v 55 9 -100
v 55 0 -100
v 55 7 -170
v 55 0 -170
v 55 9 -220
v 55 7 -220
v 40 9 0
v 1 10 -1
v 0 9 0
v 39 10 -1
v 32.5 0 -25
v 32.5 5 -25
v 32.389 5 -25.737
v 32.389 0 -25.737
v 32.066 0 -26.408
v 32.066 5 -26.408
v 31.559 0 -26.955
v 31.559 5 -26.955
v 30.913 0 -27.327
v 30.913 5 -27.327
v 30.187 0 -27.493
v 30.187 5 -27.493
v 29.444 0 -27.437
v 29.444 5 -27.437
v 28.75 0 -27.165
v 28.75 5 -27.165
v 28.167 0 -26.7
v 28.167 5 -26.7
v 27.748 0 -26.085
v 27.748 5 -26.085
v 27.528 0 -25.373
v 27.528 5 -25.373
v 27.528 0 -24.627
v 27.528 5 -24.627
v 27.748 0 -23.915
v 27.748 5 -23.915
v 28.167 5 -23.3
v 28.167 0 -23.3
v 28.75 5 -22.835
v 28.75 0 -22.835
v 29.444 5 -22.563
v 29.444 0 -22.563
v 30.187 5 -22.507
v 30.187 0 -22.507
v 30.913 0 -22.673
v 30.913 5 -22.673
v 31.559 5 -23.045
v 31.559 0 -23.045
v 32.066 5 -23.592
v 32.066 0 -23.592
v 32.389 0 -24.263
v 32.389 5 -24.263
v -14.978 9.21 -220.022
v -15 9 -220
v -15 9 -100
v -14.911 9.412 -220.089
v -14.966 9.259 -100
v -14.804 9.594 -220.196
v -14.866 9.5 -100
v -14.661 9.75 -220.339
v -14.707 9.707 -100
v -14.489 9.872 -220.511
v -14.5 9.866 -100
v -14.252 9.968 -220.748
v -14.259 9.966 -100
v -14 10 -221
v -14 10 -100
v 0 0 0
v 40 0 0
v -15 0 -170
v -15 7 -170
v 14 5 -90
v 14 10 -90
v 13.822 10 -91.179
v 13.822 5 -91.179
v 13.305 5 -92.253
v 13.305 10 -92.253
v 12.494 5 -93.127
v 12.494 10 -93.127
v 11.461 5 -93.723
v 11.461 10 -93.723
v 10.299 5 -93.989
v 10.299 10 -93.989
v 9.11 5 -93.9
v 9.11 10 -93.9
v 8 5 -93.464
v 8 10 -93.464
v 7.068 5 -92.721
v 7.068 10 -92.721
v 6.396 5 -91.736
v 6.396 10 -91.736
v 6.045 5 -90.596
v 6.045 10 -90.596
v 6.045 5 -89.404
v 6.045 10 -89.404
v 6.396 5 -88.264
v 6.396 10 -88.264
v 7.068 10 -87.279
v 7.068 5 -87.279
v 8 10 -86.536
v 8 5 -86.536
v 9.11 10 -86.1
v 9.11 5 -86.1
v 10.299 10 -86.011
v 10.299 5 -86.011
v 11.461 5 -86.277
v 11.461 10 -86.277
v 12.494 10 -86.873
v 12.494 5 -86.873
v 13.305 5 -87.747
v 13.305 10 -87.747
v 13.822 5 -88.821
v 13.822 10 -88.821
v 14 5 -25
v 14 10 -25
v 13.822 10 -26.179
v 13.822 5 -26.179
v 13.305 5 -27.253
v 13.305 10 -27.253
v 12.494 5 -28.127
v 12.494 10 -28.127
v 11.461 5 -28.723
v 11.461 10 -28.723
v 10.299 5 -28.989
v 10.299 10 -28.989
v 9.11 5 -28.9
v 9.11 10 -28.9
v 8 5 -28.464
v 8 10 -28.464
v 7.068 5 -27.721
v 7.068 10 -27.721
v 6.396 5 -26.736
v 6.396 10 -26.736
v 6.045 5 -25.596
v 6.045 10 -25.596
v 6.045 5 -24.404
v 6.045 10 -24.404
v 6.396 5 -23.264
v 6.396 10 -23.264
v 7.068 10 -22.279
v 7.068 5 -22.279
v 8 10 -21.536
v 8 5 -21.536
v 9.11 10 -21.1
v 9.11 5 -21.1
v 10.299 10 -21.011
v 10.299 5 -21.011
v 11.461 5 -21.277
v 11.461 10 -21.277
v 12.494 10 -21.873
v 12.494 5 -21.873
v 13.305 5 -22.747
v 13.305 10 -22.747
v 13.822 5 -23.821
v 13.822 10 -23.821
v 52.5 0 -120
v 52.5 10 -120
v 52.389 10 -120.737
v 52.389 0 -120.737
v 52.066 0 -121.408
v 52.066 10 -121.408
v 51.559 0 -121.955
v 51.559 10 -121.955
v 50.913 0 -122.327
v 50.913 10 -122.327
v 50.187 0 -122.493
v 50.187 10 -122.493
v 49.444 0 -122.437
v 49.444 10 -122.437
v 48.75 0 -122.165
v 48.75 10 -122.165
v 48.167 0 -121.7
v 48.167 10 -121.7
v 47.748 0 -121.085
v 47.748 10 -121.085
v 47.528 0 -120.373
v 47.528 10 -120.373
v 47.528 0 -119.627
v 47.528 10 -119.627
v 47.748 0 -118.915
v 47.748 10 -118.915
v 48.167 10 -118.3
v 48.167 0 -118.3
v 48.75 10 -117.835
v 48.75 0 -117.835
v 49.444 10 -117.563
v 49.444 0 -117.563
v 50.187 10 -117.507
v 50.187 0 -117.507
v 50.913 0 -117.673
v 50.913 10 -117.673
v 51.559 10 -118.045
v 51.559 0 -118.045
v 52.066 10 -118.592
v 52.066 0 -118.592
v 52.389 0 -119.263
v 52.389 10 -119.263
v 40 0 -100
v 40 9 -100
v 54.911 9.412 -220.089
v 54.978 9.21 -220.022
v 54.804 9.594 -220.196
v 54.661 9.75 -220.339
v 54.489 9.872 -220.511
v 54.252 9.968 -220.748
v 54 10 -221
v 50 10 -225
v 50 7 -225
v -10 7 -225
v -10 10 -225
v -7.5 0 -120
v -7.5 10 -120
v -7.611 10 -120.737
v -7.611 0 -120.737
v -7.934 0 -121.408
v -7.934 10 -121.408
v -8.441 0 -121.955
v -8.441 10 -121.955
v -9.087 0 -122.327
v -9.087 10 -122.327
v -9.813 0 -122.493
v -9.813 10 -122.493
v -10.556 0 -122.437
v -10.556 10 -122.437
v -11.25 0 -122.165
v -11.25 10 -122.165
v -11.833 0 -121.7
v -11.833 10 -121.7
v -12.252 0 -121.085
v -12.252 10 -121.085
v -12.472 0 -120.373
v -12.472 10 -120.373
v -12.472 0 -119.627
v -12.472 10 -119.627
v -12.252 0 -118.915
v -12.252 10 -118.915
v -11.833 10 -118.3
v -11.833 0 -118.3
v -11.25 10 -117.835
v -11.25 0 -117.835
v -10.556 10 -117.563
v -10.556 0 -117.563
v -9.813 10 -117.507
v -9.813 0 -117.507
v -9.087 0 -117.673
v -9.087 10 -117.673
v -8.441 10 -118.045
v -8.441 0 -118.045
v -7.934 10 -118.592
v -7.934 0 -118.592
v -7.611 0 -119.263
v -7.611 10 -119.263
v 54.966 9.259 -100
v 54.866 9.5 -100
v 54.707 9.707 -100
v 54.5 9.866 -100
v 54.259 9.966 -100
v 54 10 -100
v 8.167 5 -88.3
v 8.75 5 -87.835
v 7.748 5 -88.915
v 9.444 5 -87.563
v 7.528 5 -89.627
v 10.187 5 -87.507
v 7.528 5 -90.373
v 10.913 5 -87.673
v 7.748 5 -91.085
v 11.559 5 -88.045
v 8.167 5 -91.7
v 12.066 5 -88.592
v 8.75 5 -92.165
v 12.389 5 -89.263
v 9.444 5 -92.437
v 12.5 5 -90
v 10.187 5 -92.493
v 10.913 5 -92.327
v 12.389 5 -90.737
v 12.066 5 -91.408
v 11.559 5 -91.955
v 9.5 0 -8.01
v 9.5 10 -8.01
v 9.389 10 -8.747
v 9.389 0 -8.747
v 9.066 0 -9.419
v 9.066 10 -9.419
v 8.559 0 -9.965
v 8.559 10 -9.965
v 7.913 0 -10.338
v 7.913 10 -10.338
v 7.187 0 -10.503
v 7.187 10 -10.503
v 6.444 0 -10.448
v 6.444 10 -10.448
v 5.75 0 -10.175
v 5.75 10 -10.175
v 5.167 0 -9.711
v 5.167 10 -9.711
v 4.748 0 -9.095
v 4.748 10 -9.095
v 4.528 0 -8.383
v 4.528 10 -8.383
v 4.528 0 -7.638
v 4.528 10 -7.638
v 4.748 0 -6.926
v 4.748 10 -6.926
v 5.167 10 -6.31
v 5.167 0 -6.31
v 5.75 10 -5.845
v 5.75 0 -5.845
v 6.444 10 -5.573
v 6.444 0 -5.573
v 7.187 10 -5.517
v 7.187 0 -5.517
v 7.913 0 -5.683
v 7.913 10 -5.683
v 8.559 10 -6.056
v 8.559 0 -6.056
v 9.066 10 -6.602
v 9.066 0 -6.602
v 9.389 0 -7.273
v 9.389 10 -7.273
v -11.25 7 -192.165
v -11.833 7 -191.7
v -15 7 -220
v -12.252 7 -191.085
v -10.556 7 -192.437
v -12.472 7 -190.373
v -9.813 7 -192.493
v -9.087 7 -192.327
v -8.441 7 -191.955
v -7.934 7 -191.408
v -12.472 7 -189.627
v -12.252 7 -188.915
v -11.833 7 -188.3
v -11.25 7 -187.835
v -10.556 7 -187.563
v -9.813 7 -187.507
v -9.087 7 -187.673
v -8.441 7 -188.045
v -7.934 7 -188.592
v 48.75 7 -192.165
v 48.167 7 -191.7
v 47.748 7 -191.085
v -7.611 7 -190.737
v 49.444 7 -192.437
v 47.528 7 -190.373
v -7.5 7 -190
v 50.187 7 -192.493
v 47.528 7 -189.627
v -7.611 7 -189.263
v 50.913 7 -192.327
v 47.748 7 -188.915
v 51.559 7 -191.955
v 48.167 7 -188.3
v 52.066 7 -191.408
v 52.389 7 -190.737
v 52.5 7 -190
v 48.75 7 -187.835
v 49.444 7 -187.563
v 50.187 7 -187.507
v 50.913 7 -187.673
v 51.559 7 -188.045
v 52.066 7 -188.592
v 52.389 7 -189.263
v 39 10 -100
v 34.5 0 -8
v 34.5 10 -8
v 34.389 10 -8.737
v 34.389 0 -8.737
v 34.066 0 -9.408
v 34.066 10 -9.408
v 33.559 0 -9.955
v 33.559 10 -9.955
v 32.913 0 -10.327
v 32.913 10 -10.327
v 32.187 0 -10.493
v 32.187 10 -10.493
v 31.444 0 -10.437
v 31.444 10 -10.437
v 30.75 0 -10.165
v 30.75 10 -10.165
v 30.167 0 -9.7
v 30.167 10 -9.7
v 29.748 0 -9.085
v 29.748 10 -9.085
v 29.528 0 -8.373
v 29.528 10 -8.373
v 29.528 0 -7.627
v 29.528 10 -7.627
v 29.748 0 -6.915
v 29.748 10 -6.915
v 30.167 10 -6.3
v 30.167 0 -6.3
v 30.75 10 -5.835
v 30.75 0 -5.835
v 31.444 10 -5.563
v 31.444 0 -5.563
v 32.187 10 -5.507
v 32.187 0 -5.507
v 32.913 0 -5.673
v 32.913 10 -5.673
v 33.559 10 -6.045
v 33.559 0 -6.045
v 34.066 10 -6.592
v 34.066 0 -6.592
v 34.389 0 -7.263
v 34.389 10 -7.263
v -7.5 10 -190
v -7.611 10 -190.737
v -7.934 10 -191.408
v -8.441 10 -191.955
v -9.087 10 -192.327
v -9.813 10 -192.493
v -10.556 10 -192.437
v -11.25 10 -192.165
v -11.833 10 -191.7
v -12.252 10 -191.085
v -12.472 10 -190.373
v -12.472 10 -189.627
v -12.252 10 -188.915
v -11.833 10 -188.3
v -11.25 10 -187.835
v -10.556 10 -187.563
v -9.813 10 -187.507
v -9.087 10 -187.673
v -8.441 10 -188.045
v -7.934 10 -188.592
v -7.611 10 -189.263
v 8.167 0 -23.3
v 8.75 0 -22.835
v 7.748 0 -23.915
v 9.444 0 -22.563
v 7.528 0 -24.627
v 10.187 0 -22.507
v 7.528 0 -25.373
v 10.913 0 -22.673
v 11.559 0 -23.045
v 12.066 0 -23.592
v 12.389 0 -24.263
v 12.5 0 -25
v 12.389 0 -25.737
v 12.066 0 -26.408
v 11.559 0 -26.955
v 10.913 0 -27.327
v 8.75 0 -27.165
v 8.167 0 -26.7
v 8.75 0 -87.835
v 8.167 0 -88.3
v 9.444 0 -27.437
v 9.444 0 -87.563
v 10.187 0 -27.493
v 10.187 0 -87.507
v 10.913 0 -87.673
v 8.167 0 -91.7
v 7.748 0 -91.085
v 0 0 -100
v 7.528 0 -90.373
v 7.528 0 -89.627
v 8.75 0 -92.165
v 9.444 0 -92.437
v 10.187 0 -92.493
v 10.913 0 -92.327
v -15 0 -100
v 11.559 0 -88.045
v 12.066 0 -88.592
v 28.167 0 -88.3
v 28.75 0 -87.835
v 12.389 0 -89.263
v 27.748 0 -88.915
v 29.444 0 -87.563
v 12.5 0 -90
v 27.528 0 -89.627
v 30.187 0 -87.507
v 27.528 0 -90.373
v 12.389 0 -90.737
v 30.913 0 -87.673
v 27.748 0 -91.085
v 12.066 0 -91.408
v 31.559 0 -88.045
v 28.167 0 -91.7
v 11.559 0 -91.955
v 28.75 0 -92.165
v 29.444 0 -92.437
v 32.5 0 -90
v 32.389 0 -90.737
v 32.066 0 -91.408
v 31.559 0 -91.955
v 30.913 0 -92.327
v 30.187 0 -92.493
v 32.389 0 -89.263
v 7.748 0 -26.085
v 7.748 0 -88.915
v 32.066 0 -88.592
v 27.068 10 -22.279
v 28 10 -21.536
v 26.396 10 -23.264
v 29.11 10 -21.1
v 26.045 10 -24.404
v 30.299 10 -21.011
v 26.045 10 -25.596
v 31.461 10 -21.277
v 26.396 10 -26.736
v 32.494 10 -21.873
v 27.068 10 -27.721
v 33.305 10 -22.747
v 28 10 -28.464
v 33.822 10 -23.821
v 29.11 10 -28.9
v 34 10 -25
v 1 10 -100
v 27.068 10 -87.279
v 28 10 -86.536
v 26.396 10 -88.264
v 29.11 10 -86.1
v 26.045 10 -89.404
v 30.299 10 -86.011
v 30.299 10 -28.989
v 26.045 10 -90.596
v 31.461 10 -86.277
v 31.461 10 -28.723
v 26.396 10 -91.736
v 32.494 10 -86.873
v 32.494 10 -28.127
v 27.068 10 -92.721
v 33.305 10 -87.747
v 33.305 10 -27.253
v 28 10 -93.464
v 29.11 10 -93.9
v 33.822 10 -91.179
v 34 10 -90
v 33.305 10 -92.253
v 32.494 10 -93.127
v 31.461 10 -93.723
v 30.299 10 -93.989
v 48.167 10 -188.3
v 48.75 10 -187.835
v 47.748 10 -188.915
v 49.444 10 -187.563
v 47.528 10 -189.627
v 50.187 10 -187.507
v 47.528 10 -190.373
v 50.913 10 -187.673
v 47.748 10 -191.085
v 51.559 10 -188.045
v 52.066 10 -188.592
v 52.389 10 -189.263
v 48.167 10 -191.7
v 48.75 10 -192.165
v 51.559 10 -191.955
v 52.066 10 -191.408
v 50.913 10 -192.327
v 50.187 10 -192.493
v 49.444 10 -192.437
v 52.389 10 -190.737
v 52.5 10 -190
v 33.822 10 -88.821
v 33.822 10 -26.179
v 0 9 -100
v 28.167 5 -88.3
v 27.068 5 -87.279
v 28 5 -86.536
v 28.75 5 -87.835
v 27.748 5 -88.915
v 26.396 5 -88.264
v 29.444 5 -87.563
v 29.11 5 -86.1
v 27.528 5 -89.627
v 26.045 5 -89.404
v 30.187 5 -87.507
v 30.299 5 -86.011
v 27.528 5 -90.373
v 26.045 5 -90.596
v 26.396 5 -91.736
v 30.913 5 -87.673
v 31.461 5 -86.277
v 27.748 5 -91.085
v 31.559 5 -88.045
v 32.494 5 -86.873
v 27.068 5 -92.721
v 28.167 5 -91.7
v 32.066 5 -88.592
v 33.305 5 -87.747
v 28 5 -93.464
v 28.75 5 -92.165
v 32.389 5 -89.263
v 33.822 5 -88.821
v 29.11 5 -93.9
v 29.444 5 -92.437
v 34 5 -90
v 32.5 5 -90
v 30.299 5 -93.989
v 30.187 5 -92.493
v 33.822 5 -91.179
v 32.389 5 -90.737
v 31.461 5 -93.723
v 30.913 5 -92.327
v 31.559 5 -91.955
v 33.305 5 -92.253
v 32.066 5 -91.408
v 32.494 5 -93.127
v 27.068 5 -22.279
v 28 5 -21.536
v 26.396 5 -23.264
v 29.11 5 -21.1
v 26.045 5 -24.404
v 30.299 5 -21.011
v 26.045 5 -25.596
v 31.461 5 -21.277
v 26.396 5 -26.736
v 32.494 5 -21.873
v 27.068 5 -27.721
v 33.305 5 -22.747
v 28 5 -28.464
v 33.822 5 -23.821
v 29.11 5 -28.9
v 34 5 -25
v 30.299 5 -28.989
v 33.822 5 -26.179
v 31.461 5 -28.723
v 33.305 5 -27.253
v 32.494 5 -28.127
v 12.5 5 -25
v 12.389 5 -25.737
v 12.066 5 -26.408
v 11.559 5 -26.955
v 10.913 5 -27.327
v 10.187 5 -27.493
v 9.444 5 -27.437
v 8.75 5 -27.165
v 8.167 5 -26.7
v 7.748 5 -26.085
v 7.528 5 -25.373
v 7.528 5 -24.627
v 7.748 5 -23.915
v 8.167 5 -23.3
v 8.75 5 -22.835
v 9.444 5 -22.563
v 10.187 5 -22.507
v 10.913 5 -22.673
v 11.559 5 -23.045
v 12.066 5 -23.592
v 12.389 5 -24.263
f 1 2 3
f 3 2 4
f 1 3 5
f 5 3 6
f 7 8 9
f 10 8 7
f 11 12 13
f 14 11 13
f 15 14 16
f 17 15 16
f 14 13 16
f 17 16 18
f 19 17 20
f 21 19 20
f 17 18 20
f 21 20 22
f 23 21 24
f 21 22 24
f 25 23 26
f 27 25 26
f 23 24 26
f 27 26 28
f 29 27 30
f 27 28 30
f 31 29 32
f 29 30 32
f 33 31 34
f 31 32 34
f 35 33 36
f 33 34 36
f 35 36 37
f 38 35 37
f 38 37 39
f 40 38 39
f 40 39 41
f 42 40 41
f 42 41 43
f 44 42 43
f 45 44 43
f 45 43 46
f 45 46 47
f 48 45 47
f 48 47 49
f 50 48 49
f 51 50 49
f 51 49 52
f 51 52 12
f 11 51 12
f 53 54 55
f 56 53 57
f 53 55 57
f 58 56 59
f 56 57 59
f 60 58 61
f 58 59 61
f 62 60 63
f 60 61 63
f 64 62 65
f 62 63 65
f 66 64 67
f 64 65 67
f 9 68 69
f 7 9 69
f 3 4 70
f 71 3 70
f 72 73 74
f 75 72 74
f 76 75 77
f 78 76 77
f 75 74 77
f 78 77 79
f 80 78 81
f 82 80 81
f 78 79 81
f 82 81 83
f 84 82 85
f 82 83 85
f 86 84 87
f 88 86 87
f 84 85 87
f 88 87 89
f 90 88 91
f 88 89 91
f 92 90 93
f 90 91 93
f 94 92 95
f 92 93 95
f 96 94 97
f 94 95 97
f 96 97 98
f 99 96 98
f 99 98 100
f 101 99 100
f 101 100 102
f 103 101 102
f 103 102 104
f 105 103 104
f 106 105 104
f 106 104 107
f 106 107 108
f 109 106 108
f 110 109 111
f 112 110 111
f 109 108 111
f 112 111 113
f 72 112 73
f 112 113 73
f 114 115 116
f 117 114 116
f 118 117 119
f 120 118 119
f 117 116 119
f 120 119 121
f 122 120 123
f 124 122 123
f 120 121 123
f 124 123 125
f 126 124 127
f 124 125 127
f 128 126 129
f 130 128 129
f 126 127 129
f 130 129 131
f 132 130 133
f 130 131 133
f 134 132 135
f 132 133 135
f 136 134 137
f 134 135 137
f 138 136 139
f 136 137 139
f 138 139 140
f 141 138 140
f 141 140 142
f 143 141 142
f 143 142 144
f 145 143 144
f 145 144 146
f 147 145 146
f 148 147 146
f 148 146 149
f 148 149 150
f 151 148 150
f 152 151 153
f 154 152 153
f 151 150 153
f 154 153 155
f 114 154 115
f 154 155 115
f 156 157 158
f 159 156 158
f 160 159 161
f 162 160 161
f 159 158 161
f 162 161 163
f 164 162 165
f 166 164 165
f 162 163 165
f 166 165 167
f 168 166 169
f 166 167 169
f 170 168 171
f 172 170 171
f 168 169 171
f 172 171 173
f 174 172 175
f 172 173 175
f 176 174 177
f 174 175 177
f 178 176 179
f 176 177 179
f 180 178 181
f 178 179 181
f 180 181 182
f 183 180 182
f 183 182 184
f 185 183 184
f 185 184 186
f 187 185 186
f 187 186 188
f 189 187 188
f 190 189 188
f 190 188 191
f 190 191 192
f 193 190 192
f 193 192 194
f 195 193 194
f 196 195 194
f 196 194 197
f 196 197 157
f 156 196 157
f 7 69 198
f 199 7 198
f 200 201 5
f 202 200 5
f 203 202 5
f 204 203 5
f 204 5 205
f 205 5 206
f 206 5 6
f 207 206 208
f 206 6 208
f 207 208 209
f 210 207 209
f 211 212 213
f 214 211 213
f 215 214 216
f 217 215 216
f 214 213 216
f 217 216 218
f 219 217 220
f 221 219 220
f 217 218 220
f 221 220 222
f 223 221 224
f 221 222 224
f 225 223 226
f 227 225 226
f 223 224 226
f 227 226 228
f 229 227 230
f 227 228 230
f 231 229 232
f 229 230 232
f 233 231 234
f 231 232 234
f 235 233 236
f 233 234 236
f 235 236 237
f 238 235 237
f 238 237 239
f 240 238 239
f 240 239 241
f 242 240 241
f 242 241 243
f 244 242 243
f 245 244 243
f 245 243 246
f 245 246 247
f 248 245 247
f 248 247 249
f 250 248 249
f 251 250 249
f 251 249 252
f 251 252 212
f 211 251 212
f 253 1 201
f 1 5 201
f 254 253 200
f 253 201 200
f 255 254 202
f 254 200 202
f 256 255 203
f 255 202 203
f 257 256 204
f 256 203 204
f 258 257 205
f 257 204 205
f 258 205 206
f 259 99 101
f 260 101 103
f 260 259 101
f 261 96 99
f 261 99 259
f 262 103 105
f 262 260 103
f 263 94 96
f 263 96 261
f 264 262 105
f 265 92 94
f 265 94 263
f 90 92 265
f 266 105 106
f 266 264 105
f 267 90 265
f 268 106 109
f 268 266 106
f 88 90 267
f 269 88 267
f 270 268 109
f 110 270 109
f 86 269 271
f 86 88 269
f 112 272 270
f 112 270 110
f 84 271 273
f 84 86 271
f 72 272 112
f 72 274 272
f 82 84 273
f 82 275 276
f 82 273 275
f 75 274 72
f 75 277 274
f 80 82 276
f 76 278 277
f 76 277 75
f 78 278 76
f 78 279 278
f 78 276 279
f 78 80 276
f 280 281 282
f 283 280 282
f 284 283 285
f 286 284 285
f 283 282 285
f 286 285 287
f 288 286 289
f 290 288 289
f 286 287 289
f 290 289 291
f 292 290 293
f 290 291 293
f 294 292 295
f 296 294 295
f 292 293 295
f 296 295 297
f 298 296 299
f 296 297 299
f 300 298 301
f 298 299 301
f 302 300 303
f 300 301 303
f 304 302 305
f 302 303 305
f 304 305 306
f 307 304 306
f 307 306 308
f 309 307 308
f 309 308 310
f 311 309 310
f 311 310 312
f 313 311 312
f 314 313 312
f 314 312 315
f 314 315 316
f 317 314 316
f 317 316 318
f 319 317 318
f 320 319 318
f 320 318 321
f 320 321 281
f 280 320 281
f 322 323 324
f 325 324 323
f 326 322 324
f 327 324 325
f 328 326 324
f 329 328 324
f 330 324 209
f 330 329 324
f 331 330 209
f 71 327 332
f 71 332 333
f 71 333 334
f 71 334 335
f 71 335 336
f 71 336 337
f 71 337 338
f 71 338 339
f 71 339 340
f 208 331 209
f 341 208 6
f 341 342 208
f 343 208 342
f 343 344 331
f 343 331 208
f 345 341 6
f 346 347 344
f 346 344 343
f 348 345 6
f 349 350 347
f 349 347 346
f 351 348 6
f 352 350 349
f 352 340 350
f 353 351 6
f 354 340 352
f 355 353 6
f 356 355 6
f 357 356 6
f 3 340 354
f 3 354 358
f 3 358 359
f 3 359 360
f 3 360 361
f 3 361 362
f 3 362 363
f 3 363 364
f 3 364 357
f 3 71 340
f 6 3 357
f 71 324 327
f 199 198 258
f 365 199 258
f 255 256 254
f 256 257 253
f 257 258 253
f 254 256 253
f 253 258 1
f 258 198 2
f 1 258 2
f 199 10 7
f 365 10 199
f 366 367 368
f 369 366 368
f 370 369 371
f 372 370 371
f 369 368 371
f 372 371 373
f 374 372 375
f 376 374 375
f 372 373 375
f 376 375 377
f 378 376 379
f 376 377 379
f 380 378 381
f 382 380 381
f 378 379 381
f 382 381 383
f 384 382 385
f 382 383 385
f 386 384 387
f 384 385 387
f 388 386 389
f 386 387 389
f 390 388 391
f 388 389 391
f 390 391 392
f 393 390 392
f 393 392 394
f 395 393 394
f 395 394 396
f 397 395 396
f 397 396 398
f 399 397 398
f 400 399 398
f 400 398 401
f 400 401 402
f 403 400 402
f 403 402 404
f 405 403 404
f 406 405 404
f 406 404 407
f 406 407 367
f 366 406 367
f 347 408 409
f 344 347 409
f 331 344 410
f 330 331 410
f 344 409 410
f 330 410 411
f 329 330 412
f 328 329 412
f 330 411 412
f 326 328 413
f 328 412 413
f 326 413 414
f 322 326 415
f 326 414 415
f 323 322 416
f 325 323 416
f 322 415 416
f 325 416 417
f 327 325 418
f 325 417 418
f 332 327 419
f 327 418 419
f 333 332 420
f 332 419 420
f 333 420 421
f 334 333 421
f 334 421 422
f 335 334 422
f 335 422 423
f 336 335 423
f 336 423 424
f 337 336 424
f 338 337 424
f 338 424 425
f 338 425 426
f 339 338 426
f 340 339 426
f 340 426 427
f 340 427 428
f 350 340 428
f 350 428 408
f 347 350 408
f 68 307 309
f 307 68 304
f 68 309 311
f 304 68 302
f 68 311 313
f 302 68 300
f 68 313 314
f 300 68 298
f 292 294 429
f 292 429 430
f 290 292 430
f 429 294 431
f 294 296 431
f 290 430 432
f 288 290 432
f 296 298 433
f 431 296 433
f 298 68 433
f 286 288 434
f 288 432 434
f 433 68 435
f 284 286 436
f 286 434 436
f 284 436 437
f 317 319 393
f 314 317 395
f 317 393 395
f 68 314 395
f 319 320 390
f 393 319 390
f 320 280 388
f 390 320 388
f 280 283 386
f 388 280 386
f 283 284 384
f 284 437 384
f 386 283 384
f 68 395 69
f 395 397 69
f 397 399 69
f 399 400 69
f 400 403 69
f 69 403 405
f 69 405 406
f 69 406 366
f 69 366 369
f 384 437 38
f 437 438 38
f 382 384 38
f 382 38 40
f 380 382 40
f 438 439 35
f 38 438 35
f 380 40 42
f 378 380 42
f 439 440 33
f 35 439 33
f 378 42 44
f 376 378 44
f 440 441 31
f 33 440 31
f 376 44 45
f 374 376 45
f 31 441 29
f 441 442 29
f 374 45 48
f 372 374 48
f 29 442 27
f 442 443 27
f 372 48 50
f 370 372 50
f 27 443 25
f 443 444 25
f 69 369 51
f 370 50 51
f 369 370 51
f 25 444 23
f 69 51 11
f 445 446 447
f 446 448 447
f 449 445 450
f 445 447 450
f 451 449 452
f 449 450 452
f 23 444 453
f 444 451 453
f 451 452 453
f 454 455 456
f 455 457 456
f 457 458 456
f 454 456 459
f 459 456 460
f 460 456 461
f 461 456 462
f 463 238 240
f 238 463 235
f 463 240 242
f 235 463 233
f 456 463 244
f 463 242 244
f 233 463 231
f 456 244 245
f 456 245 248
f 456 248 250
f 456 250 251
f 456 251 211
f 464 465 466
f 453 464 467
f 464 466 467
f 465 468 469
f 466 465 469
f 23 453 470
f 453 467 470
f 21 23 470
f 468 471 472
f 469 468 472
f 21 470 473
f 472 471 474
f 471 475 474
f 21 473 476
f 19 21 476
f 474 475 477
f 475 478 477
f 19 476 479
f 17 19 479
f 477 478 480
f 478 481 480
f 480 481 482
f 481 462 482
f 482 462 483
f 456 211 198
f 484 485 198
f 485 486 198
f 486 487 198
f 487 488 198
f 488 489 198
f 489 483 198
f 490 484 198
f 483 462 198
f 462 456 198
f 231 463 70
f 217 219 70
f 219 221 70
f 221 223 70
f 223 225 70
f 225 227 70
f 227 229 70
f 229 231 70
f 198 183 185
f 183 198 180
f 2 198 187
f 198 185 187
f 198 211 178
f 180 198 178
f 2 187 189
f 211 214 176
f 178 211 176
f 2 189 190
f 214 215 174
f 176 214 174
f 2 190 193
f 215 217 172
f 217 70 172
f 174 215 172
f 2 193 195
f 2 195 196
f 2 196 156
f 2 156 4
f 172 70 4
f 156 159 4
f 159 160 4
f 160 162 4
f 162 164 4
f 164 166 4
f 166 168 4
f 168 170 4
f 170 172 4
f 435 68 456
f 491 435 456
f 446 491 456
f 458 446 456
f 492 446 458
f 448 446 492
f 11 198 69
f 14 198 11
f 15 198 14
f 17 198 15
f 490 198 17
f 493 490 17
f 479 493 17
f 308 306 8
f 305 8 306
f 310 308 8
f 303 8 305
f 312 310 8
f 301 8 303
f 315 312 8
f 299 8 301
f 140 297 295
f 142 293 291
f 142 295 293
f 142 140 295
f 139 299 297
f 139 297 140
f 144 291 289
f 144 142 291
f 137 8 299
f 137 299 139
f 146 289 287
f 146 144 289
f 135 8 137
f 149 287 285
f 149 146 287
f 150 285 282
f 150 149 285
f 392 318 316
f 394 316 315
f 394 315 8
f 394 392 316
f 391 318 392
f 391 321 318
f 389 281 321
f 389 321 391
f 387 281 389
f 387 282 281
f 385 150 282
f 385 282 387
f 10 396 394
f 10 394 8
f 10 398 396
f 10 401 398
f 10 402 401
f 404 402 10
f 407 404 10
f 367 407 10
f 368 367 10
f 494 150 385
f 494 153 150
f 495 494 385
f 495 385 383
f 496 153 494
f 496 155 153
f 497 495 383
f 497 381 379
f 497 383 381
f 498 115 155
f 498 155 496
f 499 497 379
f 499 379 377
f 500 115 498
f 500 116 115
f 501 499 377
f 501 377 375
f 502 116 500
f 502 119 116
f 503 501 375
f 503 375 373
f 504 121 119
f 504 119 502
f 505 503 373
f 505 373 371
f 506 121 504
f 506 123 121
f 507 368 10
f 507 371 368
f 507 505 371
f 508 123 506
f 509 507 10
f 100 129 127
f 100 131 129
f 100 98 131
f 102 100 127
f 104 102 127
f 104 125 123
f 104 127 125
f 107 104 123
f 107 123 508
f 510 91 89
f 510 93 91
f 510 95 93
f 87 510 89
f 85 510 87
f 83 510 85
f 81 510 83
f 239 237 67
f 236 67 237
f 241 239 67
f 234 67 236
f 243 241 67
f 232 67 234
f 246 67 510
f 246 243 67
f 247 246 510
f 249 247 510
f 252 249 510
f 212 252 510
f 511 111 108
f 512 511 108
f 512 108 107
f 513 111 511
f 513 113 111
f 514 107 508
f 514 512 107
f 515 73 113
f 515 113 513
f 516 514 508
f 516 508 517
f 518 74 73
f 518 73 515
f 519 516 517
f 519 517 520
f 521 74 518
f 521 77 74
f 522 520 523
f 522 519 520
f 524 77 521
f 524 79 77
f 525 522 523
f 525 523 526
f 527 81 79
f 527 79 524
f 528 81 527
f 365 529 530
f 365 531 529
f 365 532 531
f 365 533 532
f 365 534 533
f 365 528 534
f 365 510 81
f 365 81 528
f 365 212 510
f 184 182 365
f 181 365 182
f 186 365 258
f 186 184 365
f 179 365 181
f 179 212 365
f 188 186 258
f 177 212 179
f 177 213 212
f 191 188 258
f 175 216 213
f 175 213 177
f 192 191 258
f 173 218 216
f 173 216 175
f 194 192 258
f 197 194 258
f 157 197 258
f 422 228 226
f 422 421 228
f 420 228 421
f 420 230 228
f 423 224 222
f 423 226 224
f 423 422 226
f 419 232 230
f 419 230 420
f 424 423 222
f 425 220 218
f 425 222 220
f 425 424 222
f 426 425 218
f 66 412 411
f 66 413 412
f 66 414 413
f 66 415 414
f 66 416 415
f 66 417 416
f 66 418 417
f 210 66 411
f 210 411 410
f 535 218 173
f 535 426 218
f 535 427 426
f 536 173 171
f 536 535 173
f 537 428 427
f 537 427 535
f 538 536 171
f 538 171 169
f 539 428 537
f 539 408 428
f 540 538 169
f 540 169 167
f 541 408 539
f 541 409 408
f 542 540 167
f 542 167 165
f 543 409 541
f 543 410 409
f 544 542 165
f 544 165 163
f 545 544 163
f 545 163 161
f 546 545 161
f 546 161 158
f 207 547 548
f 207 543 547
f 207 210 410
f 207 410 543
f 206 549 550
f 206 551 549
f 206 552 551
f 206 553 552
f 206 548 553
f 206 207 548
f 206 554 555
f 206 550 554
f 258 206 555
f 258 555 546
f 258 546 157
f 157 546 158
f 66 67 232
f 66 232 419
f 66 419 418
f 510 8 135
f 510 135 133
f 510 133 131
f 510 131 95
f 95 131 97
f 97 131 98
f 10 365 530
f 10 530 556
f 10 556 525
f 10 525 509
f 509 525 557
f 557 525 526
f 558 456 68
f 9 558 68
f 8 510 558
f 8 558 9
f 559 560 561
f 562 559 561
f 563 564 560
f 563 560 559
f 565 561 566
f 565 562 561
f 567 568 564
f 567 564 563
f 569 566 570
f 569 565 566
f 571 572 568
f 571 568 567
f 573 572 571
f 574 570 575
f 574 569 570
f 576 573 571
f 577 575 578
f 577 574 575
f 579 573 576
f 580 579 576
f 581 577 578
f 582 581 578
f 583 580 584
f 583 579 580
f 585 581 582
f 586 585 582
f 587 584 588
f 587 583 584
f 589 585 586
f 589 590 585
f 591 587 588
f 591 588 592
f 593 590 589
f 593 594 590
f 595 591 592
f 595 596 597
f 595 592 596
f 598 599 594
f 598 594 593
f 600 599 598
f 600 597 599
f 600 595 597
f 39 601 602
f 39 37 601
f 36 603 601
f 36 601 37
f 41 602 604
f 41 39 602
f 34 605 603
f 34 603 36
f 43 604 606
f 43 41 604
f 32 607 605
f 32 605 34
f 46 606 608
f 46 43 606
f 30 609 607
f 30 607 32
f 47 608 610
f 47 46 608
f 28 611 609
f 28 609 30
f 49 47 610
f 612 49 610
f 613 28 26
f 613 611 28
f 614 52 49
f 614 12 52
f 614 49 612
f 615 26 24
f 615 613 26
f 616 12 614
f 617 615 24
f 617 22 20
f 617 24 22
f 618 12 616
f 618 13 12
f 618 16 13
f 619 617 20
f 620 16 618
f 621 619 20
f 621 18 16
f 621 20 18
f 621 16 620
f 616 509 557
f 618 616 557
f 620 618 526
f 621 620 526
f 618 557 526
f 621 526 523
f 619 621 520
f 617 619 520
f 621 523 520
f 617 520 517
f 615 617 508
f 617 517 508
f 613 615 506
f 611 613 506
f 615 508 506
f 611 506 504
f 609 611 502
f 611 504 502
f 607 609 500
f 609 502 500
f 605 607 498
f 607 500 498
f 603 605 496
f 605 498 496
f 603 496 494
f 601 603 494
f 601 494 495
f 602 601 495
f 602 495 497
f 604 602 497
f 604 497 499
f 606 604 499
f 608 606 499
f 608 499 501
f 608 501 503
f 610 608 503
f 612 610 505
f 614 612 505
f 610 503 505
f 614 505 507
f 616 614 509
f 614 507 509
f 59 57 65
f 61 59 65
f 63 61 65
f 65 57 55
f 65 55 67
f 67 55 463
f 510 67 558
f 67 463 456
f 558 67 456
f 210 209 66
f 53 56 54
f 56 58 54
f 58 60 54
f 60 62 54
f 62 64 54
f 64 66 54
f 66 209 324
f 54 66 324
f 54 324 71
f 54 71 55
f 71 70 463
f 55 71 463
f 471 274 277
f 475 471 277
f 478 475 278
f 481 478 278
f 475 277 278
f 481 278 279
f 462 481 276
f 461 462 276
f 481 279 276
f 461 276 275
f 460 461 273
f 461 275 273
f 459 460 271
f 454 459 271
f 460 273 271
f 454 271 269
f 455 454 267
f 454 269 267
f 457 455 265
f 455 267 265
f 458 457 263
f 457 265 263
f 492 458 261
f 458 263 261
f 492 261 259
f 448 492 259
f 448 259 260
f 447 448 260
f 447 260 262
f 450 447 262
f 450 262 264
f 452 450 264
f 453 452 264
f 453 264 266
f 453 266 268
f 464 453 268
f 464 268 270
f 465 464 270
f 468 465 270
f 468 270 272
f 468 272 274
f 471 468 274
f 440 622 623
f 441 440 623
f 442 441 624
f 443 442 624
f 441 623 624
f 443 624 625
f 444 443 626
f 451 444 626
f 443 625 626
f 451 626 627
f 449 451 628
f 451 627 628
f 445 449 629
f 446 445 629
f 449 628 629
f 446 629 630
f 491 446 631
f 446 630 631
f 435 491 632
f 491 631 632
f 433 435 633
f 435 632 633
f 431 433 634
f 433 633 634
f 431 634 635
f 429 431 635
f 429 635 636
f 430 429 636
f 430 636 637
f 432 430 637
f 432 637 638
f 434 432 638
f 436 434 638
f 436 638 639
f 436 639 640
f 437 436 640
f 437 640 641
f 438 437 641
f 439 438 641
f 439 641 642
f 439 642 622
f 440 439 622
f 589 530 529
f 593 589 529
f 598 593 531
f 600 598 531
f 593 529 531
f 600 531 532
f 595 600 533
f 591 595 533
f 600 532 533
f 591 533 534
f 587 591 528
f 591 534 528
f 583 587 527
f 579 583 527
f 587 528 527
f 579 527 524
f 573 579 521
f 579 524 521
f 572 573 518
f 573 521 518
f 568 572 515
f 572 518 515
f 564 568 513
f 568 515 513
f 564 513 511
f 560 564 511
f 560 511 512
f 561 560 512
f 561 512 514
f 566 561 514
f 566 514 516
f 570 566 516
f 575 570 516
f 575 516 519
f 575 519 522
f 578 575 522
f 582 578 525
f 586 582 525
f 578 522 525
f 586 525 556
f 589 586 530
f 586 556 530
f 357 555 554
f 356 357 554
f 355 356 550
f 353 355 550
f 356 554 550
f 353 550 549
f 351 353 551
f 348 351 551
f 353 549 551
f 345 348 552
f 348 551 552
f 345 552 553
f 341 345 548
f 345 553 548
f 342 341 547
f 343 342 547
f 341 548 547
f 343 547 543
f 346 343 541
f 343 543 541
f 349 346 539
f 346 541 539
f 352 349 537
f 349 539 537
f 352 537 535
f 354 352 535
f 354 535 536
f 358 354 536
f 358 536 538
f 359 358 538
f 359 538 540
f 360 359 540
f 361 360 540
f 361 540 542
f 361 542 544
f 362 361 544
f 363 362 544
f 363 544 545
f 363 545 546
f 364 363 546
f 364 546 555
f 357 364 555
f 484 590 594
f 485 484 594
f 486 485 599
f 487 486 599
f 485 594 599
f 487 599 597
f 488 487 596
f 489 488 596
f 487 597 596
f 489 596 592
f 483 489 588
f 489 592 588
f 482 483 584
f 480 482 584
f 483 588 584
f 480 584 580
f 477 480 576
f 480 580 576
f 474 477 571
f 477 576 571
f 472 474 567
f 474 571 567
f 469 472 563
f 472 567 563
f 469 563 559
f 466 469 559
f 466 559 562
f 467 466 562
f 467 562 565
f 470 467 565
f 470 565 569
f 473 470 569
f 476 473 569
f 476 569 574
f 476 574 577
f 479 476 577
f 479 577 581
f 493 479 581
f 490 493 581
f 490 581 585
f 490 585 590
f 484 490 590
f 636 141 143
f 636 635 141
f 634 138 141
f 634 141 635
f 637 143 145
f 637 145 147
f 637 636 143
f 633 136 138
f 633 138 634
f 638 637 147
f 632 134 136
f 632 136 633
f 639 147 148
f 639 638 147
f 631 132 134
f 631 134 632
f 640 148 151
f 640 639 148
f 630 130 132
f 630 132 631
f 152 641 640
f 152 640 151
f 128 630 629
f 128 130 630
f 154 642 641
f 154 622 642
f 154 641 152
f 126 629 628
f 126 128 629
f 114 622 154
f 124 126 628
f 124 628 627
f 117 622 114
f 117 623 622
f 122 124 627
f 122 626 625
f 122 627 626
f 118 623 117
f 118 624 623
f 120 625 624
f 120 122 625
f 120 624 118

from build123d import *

# Parameters (mm, degrees)
BOSS_EXTRUDE1_DEPTH = 10
CUT_EXTRUDE1_DEPTH  = 7
SKETCH4_R           = 4
CUT_EXTRUDE2_DEPTH  = 5
SKETCH5_R           = 2.5
CUT_EXTRUDE3_DEPTH  = 6
SKETCH6_R           = 2.5
CUT_EXTRUDE4_DEPTH  = 11
SKETCH7_R           = 2.5
CUT_EXTRUDE5_DEPTH  = 11
CHAMFER1_SIZE       = 1
FILLET1_R           = 1


with BuildPart() as part:
    # Sketch2 → Boss-Extrude1 (new body)
    with BuildSketch(Plane(origin=(0, 0, 0), x_dir=(1, 0, 0), z_dir=(0, 1, 0))):
        Polygon((0, 0), (40, 0), (40, 100), (55, 100), (55, 220), (50, 225), (-10, 225), (-15, 220), (-15, 100), (0, 100), align=None)
    extrude(amount=BOSS_EXTRUDE1_DEPTH)

    # Sketch3 → Cut-Extrude1 (cut)
    with BuildSketch(Plane.XZ):
        Polygon((-15, -220), (-10, -225), (50, -225), (55, -220), (55, -170), (-15, -170), align=None)
    extrude(amount=-CUT_EXTRUDE1_DEPTH, mode=Mode.SUBTRACT)

    # Sketch4 → Cut-Extrude2 (cut)
    with BuildSketch(Plane(origin=(0, 10, 0), x_dir=(1, 0, 0), z_dir=(0, 1, 0))):
        with Locations((10, 25)):
            Circle(SKETCH4_R)
        with Locations((30, 25)):
            Circle(SKETCH4_R)
        with Locations((10, 90)):
            Circle(SKETCH4_R)
        with Locations((30, 90)):
            Circle(SKETCH4_R)
    extrude(amount=-CUT_EXTRUDE2_DEPTH, mode=Mode.SUBTRACT)

    # Sketch5 → Cut-Extrude3 (cut, through all)
    with BuildSketch(Plane(origin=(0, 5, 0), x_dir=(1, 0, 0), z_dir=(0, 1, 0))):
        with Locations((30, 90)):
            Circle(SKETCH5_R)
        with Locations((10, 90)):
            Circle(SKETCH5_R)
        with Locations((10, 25)):
            Circle(SKETCH5_R)
        with Locations((30, 25)):
            Circle(SKETCH5_R)
    extrude(amount=-CUT_EXTRUDE3_DEPTH, mode=Mode.SUBTRACT)

    # Sketch6 → Cut-Extrude4 (cut, through all)
    with BuildSketch(Plane(origin=(0, 10, 0), x_dir=(1, 0, 0), z_dir=(0, 1, 0))):
        with Locations((50, 190)):
            Circle(SKETCH6_R)
        with Locations((-10, 190)):
            Circle(SKETCH6_R)
        with Locations((-10, 120)):
            Circle(SKETCH6_R)
        with Locations((50, 120)):
            Circle(SKETCH6_R)
    extrude(amount=-CUT_EXTRUDE4_DEPTH, mode=Mode.SUBTRACT)

    # Sketch7 → Cut-Extrude5 (cut, through all)
    with BuildSketch(Plane(origin=(0, 10, 0), x_dir=(1, 0, 0), z_dir=(0, 1, 0))):
        with Locations((32, 8)):
            Circle(SKETCH7_R)
        with Locations((7.000002149, 8.010365644)):
            Circle(SKETCH7_R)
    extrude(amount=-CUT_EXTRUDE5_DEPTH, mode=Mode.SUBTRACT)

    # Chamfer1
    chamfer1_edges = [part.edges().sort_by_distance(p)[0] for p in [
        (40, 10, -50),
        (0, 10, -50),
        (20, 10, 0),
    ]]
    chamfer(chamfer1_edges, length=CHAMFER1_SIZE)

    # Fillet1
    fillet1_edges = [part.edges().sort_by_distance(p)[0] for p in [
        (55, 10, -160),
        (-15, 10, -160),
    ]]
    fillet(fillet1_edges, radius=FILLET1_R)


solid = part.part
